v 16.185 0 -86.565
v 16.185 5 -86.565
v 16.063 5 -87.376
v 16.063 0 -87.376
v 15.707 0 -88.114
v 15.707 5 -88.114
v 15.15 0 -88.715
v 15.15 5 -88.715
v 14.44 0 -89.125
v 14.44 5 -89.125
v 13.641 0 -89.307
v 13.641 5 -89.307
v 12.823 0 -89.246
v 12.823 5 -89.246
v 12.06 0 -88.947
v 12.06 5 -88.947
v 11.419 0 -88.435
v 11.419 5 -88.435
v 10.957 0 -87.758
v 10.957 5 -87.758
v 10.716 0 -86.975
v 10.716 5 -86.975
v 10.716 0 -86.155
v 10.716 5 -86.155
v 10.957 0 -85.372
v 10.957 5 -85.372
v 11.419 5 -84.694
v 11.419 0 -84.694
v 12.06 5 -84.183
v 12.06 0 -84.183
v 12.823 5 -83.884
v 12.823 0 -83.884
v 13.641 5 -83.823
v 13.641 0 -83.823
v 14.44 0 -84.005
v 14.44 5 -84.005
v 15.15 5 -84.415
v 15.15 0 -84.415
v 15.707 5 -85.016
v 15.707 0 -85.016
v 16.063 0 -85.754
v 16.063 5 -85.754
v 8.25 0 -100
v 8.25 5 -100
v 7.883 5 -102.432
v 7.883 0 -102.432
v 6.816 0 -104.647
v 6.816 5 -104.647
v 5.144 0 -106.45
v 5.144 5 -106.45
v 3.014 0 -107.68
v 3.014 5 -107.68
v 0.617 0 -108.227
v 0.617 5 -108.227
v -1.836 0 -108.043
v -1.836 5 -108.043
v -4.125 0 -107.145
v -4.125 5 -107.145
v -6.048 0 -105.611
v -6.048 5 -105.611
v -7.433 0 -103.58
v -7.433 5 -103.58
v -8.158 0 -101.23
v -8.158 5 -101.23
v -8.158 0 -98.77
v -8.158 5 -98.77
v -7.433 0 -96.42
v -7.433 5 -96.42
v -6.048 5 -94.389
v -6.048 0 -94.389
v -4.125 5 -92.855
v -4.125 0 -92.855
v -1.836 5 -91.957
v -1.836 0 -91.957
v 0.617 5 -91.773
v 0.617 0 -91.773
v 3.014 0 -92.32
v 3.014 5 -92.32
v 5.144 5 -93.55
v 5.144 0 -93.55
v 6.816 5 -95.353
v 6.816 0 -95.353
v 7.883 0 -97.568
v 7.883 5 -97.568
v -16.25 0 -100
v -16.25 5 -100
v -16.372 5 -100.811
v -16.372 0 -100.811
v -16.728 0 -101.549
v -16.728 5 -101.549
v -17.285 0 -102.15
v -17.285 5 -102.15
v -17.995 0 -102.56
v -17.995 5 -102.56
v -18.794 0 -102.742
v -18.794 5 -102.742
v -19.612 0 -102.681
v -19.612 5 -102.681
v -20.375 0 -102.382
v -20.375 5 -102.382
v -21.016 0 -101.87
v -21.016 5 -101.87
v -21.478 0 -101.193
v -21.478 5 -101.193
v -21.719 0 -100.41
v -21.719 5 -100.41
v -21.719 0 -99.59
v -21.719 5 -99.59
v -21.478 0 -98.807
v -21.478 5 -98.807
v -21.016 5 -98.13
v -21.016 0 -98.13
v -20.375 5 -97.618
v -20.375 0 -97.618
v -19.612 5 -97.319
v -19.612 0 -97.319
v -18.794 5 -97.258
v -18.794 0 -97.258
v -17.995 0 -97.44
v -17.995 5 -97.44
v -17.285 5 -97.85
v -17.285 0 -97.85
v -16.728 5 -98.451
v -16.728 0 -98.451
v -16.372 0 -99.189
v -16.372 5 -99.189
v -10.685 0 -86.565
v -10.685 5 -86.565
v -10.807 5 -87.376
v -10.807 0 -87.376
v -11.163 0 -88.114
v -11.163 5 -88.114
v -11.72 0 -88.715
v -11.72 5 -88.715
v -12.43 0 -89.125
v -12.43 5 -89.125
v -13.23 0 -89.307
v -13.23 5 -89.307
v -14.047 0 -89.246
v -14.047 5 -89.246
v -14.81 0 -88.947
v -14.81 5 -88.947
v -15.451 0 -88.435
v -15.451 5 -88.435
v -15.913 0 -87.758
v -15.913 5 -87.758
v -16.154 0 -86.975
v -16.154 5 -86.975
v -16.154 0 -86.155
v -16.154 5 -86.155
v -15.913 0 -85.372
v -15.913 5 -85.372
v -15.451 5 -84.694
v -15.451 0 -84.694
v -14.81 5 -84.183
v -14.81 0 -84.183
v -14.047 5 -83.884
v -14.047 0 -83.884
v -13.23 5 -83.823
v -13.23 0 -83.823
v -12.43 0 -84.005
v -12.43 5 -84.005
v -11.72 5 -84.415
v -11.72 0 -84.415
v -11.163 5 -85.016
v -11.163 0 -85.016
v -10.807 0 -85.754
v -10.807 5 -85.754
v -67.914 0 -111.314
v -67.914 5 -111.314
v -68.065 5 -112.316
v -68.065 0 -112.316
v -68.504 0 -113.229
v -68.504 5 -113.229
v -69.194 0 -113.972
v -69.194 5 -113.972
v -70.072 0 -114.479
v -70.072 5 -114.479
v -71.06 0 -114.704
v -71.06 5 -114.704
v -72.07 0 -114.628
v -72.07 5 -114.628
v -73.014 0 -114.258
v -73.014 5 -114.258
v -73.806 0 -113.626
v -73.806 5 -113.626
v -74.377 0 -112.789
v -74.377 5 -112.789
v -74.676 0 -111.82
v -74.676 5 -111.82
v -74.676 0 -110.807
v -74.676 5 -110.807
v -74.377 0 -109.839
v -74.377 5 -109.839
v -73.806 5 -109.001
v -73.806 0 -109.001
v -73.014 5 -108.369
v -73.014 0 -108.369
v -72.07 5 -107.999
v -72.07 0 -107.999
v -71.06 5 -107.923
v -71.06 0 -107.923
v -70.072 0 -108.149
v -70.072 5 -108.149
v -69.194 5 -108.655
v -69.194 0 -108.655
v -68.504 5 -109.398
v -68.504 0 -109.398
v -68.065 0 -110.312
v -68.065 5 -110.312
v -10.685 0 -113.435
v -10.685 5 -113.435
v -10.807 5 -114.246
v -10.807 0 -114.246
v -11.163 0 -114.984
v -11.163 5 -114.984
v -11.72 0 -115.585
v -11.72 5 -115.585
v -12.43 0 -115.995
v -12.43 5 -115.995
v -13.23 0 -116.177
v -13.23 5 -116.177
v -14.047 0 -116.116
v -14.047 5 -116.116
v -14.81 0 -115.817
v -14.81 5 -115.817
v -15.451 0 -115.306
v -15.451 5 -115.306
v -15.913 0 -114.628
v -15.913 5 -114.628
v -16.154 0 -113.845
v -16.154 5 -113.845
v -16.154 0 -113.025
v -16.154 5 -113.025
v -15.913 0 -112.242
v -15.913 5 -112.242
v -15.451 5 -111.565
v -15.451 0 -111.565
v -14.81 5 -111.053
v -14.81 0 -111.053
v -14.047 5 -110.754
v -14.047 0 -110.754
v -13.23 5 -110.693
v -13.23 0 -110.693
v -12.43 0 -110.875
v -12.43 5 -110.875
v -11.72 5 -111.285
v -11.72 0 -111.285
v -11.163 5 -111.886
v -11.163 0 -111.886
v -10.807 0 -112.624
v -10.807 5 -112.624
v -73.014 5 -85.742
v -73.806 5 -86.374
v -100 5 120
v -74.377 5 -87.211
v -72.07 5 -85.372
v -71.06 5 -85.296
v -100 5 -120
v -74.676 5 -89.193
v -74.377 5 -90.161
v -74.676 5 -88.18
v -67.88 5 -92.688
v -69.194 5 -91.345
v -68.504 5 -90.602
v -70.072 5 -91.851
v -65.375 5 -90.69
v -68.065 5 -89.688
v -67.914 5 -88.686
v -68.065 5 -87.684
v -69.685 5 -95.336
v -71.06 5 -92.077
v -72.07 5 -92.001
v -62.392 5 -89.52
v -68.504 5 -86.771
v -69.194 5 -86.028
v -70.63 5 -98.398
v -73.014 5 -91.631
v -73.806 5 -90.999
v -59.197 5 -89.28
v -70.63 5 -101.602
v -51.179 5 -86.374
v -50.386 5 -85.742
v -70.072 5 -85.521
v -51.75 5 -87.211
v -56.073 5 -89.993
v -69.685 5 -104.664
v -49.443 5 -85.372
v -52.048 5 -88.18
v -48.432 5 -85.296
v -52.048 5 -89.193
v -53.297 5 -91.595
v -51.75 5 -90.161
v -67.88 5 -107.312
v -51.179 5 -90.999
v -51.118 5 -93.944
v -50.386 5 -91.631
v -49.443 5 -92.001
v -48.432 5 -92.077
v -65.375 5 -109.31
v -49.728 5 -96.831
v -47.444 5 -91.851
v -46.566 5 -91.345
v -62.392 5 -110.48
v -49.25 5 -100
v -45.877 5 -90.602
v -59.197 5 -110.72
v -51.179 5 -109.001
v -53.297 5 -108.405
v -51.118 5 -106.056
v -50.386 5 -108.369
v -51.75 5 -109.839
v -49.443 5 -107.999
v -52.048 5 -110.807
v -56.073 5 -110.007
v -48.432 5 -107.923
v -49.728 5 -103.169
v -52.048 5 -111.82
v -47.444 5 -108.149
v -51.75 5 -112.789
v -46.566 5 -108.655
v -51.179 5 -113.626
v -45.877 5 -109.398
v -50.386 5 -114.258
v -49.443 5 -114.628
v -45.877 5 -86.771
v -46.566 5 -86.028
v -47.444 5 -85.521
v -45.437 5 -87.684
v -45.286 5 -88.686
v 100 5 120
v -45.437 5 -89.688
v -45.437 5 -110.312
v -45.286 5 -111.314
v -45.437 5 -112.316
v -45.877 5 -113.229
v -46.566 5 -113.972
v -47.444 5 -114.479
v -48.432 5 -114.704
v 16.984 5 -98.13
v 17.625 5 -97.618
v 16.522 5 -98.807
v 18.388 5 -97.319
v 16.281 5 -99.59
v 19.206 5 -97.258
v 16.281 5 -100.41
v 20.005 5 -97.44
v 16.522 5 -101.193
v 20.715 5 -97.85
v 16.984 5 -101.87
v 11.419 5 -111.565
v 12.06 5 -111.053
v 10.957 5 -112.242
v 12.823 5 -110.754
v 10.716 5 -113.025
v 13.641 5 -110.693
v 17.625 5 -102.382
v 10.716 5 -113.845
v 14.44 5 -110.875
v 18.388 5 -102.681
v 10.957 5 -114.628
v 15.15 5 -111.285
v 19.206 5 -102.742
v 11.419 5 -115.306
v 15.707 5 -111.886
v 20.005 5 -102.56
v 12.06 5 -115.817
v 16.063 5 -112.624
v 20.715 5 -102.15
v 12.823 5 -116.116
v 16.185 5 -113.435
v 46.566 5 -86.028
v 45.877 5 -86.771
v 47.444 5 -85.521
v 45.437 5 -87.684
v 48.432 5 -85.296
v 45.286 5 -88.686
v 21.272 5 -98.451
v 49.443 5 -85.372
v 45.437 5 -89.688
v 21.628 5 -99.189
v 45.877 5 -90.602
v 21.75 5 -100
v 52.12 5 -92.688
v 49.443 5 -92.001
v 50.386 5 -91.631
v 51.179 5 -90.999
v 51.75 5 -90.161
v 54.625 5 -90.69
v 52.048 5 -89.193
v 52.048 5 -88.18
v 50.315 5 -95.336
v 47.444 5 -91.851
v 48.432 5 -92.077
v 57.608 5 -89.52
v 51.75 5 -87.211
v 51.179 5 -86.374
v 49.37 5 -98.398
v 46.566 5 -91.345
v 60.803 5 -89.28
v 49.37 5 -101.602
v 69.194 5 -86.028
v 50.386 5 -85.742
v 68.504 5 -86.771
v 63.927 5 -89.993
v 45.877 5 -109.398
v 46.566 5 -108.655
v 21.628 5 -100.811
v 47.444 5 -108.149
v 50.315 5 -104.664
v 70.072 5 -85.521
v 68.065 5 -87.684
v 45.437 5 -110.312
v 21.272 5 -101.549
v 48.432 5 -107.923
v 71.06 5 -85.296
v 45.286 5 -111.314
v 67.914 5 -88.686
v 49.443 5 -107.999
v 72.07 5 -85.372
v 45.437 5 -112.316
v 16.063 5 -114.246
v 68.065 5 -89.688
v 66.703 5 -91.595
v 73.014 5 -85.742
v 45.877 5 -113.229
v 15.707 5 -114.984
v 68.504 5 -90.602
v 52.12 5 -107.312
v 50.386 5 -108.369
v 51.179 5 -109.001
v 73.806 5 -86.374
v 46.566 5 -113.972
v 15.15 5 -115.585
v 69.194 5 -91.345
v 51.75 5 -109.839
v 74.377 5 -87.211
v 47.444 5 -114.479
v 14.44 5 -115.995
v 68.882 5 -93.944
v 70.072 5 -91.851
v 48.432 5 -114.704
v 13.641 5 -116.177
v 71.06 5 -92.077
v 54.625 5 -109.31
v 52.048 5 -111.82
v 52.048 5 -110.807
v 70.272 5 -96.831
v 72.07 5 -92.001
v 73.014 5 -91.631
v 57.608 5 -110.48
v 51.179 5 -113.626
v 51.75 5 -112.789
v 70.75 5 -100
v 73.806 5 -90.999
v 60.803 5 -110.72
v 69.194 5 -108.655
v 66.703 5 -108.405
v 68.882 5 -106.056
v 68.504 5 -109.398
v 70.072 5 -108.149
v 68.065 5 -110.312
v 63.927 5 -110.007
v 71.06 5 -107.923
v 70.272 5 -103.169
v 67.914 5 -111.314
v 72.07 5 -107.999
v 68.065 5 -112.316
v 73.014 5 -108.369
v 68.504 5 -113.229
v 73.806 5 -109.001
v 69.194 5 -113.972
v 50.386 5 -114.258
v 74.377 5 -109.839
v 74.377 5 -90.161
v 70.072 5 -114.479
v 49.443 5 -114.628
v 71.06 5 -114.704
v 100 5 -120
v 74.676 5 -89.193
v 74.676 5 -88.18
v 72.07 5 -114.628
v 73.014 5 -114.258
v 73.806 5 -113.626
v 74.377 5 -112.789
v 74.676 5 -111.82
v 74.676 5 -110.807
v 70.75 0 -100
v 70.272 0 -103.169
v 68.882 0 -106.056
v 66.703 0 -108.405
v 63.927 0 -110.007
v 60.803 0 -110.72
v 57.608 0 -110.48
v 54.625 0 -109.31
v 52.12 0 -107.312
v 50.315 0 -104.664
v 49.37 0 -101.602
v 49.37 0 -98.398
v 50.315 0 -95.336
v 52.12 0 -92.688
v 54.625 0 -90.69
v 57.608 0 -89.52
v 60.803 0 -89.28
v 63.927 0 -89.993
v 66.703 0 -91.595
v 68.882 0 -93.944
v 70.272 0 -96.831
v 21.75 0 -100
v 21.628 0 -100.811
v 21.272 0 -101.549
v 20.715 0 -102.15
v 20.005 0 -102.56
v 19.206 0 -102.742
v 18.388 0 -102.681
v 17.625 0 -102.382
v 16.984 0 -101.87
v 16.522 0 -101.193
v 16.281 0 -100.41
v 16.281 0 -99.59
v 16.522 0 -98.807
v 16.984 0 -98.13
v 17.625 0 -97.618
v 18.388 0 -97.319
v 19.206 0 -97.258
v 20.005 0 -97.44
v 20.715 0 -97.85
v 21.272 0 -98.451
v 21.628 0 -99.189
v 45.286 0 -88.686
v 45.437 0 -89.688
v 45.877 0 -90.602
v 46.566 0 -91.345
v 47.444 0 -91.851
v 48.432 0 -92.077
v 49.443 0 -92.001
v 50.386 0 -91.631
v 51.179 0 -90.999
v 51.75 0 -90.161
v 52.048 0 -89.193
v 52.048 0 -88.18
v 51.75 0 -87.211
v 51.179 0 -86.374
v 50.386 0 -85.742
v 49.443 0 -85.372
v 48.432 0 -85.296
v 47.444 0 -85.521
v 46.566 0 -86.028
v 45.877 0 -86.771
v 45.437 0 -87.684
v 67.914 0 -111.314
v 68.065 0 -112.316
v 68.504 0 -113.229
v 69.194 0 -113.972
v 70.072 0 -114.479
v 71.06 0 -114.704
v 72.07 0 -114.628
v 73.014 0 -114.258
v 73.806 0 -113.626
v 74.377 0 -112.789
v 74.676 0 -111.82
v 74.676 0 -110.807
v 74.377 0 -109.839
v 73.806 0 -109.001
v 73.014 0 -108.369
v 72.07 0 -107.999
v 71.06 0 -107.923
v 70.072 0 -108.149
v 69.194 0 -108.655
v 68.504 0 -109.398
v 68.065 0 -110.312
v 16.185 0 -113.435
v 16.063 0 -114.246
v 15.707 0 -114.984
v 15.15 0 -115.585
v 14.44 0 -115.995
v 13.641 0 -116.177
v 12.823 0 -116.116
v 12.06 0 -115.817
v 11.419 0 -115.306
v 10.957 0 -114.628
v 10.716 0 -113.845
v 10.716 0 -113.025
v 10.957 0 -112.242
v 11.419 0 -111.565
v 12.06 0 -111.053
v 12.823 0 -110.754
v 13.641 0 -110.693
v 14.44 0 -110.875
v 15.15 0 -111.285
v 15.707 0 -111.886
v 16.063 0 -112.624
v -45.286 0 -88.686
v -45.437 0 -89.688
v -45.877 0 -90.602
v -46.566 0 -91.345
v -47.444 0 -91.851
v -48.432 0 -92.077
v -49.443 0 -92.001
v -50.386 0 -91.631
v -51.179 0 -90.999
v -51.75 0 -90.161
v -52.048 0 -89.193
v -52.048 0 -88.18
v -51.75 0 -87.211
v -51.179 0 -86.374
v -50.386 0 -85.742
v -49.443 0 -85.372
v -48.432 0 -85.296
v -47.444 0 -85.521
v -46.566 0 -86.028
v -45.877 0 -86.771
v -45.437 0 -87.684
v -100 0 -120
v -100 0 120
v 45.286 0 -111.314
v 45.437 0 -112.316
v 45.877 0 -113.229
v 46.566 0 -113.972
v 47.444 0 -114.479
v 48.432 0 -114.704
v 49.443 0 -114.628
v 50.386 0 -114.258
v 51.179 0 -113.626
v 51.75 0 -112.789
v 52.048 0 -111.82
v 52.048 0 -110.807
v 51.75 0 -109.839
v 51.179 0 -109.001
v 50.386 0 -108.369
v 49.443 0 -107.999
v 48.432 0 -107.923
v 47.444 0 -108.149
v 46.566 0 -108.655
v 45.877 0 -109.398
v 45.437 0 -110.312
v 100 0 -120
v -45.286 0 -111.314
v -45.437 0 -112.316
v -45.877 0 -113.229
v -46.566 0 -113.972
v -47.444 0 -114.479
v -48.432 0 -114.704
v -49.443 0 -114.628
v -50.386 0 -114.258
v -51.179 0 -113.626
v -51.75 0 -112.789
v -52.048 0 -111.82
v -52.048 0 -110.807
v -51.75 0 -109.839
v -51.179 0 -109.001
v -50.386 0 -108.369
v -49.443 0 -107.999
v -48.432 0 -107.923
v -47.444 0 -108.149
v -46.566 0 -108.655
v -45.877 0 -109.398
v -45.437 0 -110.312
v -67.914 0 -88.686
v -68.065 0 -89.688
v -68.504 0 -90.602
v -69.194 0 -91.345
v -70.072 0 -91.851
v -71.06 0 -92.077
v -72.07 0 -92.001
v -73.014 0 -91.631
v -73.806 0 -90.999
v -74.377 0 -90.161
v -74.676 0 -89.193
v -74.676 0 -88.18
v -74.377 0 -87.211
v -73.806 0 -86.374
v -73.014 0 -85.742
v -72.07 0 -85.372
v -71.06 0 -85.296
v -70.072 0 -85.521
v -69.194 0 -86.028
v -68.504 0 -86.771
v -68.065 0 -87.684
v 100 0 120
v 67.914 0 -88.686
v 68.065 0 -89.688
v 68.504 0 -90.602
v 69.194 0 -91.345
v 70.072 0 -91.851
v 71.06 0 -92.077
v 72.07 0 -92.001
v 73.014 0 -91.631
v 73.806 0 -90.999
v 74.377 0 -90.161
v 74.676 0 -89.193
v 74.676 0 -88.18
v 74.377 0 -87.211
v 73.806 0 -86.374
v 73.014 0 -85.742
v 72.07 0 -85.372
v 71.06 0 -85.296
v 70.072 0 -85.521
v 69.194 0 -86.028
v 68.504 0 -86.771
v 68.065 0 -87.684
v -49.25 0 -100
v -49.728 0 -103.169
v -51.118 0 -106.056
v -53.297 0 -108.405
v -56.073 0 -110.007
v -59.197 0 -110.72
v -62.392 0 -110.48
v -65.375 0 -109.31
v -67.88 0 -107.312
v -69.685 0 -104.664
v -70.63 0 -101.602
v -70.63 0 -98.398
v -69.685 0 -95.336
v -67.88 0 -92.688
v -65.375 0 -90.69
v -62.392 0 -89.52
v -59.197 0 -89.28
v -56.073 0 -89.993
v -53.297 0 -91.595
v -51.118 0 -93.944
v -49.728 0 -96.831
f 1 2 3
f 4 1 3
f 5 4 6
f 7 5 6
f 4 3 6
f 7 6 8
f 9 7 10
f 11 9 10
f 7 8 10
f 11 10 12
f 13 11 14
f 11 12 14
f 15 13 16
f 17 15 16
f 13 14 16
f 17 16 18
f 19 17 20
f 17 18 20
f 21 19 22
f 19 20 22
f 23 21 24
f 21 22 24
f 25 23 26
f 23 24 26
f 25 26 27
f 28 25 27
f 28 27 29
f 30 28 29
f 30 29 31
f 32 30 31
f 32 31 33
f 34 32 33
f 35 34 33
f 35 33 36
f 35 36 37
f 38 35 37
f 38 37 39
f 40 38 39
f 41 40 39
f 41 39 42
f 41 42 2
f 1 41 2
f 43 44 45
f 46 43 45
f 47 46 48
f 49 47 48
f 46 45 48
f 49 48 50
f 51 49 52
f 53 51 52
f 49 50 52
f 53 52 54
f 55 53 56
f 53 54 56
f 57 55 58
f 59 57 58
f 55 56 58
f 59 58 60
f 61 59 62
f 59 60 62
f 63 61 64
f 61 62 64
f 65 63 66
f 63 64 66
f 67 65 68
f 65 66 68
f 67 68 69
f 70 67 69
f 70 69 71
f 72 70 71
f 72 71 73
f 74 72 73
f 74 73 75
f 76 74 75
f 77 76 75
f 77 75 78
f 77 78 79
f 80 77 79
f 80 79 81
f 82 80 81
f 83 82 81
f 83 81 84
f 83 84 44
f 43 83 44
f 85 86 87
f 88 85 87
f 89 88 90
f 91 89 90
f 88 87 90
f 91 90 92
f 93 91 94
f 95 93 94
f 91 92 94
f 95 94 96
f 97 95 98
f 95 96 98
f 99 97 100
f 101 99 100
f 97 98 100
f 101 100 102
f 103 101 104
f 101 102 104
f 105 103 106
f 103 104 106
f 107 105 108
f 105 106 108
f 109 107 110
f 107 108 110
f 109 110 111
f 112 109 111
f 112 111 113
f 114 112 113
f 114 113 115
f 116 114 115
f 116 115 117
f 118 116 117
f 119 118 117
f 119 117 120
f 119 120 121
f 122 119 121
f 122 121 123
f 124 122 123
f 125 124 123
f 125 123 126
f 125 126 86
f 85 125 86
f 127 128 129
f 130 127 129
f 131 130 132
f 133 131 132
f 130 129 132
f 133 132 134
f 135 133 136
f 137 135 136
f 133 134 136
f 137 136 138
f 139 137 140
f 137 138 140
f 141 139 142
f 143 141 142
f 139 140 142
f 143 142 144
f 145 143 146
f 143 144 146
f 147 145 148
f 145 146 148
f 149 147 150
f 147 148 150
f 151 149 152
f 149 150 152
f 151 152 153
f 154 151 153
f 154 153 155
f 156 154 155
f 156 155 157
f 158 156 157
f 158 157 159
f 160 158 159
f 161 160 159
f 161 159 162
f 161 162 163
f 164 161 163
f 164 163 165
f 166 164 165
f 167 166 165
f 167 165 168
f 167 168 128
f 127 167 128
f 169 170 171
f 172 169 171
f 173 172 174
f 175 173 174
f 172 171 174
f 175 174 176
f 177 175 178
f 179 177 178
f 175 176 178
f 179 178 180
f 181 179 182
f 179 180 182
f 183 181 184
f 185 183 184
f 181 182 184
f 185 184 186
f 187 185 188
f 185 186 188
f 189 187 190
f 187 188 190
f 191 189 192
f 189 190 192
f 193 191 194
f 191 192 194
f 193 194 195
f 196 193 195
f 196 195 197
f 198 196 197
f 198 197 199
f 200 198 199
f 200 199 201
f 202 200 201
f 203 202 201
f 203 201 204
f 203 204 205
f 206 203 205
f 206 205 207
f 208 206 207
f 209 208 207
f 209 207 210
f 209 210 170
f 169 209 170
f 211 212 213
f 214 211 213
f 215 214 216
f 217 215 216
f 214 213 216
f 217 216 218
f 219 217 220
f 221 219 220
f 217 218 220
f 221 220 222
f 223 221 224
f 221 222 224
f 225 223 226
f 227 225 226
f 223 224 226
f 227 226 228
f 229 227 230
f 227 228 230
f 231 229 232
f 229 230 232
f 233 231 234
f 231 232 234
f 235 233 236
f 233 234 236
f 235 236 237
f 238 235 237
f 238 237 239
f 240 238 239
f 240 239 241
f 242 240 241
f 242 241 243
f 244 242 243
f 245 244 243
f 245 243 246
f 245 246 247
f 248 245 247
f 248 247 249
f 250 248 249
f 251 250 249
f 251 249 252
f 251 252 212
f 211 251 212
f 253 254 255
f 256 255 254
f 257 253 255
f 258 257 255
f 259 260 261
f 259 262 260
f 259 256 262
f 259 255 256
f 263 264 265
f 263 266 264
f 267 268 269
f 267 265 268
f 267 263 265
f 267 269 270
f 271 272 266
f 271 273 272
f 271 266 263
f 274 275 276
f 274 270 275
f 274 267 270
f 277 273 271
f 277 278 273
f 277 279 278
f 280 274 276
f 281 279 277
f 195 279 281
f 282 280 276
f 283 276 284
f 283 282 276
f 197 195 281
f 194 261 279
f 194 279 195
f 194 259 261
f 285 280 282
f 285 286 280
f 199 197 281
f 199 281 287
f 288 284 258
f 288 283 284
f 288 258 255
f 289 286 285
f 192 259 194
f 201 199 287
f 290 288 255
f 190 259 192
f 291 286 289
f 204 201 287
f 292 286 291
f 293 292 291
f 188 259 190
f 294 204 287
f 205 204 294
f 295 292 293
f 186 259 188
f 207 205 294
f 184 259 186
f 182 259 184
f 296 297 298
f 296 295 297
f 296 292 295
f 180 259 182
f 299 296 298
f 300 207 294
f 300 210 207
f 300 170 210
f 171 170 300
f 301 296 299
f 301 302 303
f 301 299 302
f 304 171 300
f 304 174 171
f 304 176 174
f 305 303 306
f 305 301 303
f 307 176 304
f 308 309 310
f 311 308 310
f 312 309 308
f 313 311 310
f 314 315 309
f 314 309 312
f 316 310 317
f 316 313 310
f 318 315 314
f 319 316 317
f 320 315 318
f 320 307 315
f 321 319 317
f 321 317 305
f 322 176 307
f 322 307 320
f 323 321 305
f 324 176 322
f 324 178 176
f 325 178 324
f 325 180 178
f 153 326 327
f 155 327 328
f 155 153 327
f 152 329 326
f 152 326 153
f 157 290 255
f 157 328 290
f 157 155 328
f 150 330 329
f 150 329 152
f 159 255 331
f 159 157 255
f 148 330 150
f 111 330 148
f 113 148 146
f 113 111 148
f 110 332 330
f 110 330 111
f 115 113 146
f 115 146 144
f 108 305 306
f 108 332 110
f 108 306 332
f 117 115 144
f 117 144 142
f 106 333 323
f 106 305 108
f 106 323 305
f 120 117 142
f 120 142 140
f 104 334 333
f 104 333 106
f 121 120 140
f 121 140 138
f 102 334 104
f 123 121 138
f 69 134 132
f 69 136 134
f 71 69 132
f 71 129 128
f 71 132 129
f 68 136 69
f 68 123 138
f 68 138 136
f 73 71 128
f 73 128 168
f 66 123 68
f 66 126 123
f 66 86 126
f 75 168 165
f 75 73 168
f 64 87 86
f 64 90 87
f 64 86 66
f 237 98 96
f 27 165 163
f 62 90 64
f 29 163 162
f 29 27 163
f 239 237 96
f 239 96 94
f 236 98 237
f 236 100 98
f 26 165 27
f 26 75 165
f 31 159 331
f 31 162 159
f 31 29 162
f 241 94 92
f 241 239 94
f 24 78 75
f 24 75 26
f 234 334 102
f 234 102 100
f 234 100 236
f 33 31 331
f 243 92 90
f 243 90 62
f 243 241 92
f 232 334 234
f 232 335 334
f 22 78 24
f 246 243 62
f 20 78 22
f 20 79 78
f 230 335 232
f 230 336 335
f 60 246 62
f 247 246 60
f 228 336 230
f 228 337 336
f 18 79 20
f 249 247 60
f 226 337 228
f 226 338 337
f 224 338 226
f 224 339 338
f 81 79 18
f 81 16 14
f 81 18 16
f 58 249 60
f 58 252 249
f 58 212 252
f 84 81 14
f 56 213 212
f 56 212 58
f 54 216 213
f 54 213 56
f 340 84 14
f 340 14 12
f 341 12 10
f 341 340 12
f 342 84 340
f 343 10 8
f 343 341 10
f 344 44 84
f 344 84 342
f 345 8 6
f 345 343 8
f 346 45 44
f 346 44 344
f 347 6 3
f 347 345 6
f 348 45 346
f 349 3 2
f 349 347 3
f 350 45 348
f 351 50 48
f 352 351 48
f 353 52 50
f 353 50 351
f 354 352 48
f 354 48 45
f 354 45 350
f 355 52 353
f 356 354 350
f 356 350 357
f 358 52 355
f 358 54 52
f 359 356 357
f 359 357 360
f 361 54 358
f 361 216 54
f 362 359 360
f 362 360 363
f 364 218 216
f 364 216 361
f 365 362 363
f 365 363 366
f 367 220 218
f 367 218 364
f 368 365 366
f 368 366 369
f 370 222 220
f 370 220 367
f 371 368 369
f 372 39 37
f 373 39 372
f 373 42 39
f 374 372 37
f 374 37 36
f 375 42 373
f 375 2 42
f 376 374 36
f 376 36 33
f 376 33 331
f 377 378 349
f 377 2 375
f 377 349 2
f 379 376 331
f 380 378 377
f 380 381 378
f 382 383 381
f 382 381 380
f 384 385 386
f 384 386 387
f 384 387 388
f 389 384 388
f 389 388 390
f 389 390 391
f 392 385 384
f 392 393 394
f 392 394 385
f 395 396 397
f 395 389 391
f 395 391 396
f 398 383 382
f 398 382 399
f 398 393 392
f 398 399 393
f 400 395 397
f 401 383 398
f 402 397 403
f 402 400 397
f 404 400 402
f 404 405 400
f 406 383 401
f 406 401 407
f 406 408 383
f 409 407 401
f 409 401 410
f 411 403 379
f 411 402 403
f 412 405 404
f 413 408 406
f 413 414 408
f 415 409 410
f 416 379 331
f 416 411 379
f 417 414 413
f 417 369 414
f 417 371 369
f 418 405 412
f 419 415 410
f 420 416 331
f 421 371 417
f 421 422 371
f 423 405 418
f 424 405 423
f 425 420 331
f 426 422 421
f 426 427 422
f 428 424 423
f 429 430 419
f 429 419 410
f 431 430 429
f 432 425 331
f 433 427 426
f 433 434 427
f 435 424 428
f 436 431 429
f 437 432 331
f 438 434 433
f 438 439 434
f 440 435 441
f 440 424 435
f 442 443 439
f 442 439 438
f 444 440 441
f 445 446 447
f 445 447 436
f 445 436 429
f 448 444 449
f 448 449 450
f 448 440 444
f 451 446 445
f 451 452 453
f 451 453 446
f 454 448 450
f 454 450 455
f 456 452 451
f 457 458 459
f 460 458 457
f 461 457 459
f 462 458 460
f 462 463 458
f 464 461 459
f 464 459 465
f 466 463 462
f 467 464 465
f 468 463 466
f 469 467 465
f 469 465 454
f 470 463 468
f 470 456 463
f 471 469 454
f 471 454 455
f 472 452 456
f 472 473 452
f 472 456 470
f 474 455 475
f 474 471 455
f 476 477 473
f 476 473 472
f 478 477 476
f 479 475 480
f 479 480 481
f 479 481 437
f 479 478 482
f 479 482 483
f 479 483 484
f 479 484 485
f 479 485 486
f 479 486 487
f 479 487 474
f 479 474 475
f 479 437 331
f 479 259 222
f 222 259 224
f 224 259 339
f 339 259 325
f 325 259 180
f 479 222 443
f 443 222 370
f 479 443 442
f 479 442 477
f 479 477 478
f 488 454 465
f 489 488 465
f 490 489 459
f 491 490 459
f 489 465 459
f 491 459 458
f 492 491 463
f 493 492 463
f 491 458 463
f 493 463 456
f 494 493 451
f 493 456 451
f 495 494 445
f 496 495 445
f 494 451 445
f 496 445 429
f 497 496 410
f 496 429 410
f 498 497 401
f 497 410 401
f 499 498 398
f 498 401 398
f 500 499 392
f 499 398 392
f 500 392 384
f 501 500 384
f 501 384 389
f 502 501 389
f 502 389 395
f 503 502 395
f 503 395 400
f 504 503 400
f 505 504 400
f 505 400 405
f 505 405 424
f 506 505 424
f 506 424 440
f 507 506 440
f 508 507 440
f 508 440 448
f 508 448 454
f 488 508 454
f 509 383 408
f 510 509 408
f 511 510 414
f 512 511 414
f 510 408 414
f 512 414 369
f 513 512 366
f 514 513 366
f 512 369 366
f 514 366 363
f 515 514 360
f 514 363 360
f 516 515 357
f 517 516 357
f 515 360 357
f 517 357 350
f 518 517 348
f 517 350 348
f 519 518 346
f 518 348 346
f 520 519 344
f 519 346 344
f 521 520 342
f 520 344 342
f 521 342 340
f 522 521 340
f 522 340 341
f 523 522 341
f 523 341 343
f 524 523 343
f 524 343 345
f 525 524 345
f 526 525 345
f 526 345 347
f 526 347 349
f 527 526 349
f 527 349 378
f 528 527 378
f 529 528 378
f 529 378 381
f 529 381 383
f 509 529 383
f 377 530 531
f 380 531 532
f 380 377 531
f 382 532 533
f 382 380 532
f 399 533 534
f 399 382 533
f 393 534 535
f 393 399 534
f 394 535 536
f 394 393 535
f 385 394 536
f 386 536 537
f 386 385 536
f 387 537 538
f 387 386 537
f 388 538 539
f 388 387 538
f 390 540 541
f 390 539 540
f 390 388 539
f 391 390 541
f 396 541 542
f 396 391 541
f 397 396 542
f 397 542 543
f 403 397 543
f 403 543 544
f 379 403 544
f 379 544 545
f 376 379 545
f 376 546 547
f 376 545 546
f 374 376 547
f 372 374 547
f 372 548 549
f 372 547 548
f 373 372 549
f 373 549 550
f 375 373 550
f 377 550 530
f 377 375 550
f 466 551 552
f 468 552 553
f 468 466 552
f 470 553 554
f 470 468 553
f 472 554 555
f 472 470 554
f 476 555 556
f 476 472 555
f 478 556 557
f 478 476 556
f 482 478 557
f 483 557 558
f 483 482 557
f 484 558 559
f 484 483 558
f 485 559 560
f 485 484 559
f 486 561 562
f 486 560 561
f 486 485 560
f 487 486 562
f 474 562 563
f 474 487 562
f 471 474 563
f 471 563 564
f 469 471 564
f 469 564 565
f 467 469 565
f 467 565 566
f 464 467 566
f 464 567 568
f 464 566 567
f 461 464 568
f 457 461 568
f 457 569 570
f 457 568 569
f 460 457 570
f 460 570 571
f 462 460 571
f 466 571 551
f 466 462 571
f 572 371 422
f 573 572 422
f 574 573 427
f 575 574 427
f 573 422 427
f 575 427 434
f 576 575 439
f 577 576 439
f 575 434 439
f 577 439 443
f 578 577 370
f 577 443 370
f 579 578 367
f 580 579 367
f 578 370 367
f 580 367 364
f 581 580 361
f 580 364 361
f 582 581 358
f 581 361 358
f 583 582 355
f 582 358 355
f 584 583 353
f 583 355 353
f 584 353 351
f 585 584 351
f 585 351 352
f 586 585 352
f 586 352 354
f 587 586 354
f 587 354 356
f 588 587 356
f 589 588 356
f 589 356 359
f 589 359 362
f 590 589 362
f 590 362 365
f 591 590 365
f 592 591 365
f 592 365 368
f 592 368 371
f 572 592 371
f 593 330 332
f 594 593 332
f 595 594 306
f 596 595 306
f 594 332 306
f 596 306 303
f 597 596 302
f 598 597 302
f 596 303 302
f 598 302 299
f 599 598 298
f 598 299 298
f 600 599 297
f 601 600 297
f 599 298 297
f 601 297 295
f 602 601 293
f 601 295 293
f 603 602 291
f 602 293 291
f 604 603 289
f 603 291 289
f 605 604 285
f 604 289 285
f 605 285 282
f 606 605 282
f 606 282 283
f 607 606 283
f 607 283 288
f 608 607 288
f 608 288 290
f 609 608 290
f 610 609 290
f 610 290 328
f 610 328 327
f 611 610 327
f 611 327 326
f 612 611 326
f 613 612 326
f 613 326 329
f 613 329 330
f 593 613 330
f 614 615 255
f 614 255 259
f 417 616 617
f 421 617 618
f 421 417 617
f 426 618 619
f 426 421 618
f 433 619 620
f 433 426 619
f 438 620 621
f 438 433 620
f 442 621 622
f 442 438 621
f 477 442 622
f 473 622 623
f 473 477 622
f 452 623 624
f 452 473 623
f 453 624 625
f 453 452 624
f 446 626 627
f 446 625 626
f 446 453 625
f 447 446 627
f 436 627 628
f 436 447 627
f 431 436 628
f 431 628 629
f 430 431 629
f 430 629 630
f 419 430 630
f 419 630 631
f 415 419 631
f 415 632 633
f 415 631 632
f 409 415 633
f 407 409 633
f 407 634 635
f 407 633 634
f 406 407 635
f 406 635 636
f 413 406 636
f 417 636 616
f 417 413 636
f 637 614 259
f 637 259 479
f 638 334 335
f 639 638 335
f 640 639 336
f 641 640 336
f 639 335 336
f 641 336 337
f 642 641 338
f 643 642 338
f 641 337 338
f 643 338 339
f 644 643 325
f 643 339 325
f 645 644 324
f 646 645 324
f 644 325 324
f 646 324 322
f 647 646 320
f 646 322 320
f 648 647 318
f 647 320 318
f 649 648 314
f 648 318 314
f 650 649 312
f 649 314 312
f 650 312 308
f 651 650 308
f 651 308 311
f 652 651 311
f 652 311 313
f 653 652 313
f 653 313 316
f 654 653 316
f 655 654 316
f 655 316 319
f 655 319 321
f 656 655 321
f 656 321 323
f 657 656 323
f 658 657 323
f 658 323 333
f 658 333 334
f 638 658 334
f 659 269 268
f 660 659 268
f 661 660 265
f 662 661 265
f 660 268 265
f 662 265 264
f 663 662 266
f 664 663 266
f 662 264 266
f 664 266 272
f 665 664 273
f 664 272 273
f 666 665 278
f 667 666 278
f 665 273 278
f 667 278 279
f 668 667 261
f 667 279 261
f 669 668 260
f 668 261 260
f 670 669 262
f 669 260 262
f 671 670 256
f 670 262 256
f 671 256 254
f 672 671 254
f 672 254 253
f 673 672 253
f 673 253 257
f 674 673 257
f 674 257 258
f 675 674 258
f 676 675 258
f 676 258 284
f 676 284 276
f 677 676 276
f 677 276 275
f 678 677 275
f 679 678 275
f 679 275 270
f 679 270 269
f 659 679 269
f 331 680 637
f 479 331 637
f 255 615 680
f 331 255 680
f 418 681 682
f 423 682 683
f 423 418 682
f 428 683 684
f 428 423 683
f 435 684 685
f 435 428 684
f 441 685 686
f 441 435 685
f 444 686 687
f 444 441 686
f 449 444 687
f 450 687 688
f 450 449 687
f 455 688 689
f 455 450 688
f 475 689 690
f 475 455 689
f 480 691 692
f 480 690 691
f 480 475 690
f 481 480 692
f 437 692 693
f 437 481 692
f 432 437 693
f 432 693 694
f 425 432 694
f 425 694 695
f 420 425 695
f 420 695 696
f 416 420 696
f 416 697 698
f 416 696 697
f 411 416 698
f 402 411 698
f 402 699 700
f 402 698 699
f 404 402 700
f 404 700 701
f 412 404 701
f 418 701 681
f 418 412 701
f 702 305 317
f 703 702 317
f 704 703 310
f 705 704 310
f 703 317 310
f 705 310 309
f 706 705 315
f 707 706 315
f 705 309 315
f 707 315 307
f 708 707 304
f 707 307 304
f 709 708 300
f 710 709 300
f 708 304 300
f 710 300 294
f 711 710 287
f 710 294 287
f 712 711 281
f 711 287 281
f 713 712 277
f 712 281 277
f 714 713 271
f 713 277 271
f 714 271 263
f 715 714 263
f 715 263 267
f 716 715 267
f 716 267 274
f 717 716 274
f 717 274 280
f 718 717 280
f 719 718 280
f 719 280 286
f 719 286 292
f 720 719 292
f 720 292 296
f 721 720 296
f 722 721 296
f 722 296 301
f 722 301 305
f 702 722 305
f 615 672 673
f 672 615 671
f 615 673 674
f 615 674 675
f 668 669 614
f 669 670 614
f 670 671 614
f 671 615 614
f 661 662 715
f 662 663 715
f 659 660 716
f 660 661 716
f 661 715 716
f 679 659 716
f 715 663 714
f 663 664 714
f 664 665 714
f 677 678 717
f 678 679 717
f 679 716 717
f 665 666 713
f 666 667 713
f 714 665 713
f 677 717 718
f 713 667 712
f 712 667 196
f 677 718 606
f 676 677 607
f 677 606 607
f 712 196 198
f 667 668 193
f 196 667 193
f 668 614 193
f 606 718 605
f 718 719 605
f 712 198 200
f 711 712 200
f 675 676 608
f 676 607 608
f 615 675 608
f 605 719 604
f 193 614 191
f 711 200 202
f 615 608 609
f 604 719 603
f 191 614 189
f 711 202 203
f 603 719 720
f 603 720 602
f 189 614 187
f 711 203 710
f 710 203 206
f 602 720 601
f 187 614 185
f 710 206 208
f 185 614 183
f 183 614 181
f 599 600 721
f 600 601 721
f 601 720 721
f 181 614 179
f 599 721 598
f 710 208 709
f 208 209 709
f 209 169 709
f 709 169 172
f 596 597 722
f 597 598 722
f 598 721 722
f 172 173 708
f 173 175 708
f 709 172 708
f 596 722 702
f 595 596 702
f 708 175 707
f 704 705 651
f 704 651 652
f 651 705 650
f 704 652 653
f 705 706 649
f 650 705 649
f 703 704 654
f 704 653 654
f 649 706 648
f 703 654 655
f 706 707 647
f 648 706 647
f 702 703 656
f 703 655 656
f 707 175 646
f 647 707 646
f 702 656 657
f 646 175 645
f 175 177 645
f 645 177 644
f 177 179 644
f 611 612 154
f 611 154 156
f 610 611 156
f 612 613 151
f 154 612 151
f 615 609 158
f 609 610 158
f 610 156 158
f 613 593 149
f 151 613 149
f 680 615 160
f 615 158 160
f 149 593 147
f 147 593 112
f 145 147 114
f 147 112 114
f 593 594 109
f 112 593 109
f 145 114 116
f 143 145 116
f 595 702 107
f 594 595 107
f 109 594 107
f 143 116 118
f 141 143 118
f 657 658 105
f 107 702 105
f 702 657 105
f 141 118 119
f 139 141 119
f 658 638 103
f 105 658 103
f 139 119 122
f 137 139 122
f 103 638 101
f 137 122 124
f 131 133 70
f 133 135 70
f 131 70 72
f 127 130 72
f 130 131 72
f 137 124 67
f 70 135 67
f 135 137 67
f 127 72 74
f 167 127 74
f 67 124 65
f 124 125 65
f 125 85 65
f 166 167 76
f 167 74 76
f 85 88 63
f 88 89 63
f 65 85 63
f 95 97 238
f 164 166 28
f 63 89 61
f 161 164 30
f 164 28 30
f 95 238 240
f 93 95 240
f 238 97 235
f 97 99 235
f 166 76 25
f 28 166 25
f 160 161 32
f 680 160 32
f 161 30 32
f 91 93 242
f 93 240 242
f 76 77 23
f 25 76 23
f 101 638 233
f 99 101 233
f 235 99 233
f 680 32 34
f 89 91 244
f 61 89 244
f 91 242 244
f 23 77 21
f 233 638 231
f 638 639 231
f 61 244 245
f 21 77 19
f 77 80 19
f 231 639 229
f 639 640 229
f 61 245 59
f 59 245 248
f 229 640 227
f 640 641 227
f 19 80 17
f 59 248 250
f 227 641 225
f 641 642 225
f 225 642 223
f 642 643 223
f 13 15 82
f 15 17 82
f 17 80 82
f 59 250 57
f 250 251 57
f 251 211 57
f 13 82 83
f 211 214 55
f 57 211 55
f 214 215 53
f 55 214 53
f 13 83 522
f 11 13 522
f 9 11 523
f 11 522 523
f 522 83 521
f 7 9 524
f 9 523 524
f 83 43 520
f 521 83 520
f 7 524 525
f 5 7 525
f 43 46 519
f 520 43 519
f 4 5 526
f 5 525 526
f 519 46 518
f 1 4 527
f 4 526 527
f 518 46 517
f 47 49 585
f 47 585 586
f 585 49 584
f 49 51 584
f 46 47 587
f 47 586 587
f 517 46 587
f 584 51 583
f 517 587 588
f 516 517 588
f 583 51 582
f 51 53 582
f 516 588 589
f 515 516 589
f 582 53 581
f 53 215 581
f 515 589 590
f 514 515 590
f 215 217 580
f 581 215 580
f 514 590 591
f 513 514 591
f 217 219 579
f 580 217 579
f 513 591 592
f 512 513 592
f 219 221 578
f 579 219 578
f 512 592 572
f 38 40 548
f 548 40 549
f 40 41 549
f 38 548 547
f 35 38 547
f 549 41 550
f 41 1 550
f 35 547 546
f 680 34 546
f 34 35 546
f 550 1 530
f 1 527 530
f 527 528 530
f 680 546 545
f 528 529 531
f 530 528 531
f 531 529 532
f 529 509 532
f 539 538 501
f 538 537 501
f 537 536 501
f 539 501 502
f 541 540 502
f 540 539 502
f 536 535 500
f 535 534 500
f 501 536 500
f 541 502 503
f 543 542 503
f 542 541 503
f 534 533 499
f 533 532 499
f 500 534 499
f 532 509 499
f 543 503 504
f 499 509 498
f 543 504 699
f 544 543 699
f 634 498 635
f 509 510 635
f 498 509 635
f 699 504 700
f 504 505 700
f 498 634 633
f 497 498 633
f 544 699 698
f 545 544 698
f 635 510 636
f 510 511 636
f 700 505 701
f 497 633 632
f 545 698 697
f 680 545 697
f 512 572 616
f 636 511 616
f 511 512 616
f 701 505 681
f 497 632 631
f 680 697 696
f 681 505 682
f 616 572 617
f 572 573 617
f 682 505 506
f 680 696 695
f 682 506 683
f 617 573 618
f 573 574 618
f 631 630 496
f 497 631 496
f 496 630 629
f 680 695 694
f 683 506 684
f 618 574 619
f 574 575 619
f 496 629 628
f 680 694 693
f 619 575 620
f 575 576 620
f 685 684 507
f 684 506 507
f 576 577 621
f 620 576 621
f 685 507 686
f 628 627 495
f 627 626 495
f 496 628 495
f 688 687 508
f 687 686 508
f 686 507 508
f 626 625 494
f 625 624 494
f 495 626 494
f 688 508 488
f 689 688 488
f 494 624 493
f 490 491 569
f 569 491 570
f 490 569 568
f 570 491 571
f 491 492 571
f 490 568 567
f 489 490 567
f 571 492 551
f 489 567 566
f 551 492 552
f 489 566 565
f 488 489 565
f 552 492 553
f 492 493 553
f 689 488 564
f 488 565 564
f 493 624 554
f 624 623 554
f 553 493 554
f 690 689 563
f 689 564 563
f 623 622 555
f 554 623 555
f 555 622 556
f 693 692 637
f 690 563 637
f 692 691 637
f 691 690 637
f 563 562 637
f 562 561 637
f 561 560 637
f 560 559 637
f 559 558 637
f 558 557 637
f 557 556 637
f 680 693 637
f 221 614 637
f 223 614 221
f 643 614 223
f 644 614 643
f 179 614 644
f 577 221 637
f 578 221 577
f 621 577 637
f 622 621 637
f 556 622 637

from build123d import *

# Parameters (mm, degrees)
SKETCH1_W           = 200
SKETCH1_H           = 240
BOSS_EXTRUDE1_DEPTH = 5
SKETCH3_R           = 8.25
CUT_EXTRUDE1_DEPTH  = 6
SKETCH4_R           = 2.75
CUT_EXTRUDE2_DEPTH  = 6
SKETCH5_R           = 10.75
CUT_EXTRUDE4_DEPTH  = 6
SKETCH6_R           = 3.4
CUT_EXTRUDE5_DEPTH  = 6


with BuildPart() as part:
    # Sketch1 → Boss-Extrude1 (new body)
    with BuildSketch(Plane(origin=(0, 0, 0), x_dir=(1, 0, 0), z_dir=(0, 1, 0))):
        Rectangle(SKETCH1_W, SKETCH1_H)
    extrude(amount=BOSS_EXTRUDE1_DEPTH)

    # Sketch3 → Cut-Extrude1 (cut, through all)
    with BuildSketch(Plane(origin=(0, 5, 0), x_dir=(1, 0, 0), z_dir=(0, 1, 0))):
        with Locations((0, 100)):
            Circle(SKETCH3_R)
    extrude(amount=-CUT_EXTRUDE1_DEPTH, mode=Mode.SUBTRACT)

    # Sketch4 → Cut-Extrude2 (cut, through all)
    with BuildSketch(Plane(origin=(0, 5, 0), x_dir=(1, 0, 0), z_dir=(0, 1, 0))):
        with Locations((19, 100)):
            Circle(SKETCH4_R)
        with Locations((13.435028843, 113.435028843)):
            Circle(SKETCH4_R)
        with Locations((13.435028843, 86.564971157)):
            Circle(SKETCH4_R)
        with Locations((-13.435028843, 86.564971157)):
            Circle(SKETCH4_R)
        with Locations((-19, 100)):
            Circle(SKETCH4_R)
        with Locations((-13.435028843, 113.435028843)):
            Circle(SKETCH4_R)
    extrude(amount=-CUT_EXTRUDE2_DEPTH, mode=Mode.SUBTRACT)

    # Sketch5 → Cut-Extrude4 (cut, through all)
    with BuildSketch(Plane(origin=(0, 5, 0), x_dir=(1, 0, 0), z_dir=(0, 1, 0))):
        with Locations((-60, 100)):
            Circle(SKETCH5_R)
        with Locations((60, 100)):
            Circle(SKETCH5_R)
    extrude(amount=-CUT_EXTRUDE4_DEPTH, mode=Mode.SUBTRACT)

    # Sketch6 → Cut-Extrude5 (cut, through all)
    with BuildSketch(Plane(origin=(0, 5, 0), x_dir=(1, 0, 0), z_dir=(0, 1, 0))):
        with Locations((-48.686291501, 111.313708499)):
            Circle(SKETCH6_R)
        with Locations((-48.686291501, 88.686291501)):
            Circle(SKETCH6_R)
        with Locations((-71.313708499, 88.686291501)):
            Circle(SKETCH6_R)
        with Locations((-71.313708499, 111.313708499)):
            Circle(SKETCH6_R)
    cut_extrude5 = extrude(amount=-CUT_EXTRUDE5_DEPTH, mode=Mode.SUBTRACT)

    # Mirror1: Cut-Extrude5 across plane
    add(cut_extrude5.mirror(Plane(origin=(0, 0, 0), x_dir=(0, 0, 1), z_dir=(1, 0, 0))), mode=Mode.SUBTRACT)


solid = part.part
